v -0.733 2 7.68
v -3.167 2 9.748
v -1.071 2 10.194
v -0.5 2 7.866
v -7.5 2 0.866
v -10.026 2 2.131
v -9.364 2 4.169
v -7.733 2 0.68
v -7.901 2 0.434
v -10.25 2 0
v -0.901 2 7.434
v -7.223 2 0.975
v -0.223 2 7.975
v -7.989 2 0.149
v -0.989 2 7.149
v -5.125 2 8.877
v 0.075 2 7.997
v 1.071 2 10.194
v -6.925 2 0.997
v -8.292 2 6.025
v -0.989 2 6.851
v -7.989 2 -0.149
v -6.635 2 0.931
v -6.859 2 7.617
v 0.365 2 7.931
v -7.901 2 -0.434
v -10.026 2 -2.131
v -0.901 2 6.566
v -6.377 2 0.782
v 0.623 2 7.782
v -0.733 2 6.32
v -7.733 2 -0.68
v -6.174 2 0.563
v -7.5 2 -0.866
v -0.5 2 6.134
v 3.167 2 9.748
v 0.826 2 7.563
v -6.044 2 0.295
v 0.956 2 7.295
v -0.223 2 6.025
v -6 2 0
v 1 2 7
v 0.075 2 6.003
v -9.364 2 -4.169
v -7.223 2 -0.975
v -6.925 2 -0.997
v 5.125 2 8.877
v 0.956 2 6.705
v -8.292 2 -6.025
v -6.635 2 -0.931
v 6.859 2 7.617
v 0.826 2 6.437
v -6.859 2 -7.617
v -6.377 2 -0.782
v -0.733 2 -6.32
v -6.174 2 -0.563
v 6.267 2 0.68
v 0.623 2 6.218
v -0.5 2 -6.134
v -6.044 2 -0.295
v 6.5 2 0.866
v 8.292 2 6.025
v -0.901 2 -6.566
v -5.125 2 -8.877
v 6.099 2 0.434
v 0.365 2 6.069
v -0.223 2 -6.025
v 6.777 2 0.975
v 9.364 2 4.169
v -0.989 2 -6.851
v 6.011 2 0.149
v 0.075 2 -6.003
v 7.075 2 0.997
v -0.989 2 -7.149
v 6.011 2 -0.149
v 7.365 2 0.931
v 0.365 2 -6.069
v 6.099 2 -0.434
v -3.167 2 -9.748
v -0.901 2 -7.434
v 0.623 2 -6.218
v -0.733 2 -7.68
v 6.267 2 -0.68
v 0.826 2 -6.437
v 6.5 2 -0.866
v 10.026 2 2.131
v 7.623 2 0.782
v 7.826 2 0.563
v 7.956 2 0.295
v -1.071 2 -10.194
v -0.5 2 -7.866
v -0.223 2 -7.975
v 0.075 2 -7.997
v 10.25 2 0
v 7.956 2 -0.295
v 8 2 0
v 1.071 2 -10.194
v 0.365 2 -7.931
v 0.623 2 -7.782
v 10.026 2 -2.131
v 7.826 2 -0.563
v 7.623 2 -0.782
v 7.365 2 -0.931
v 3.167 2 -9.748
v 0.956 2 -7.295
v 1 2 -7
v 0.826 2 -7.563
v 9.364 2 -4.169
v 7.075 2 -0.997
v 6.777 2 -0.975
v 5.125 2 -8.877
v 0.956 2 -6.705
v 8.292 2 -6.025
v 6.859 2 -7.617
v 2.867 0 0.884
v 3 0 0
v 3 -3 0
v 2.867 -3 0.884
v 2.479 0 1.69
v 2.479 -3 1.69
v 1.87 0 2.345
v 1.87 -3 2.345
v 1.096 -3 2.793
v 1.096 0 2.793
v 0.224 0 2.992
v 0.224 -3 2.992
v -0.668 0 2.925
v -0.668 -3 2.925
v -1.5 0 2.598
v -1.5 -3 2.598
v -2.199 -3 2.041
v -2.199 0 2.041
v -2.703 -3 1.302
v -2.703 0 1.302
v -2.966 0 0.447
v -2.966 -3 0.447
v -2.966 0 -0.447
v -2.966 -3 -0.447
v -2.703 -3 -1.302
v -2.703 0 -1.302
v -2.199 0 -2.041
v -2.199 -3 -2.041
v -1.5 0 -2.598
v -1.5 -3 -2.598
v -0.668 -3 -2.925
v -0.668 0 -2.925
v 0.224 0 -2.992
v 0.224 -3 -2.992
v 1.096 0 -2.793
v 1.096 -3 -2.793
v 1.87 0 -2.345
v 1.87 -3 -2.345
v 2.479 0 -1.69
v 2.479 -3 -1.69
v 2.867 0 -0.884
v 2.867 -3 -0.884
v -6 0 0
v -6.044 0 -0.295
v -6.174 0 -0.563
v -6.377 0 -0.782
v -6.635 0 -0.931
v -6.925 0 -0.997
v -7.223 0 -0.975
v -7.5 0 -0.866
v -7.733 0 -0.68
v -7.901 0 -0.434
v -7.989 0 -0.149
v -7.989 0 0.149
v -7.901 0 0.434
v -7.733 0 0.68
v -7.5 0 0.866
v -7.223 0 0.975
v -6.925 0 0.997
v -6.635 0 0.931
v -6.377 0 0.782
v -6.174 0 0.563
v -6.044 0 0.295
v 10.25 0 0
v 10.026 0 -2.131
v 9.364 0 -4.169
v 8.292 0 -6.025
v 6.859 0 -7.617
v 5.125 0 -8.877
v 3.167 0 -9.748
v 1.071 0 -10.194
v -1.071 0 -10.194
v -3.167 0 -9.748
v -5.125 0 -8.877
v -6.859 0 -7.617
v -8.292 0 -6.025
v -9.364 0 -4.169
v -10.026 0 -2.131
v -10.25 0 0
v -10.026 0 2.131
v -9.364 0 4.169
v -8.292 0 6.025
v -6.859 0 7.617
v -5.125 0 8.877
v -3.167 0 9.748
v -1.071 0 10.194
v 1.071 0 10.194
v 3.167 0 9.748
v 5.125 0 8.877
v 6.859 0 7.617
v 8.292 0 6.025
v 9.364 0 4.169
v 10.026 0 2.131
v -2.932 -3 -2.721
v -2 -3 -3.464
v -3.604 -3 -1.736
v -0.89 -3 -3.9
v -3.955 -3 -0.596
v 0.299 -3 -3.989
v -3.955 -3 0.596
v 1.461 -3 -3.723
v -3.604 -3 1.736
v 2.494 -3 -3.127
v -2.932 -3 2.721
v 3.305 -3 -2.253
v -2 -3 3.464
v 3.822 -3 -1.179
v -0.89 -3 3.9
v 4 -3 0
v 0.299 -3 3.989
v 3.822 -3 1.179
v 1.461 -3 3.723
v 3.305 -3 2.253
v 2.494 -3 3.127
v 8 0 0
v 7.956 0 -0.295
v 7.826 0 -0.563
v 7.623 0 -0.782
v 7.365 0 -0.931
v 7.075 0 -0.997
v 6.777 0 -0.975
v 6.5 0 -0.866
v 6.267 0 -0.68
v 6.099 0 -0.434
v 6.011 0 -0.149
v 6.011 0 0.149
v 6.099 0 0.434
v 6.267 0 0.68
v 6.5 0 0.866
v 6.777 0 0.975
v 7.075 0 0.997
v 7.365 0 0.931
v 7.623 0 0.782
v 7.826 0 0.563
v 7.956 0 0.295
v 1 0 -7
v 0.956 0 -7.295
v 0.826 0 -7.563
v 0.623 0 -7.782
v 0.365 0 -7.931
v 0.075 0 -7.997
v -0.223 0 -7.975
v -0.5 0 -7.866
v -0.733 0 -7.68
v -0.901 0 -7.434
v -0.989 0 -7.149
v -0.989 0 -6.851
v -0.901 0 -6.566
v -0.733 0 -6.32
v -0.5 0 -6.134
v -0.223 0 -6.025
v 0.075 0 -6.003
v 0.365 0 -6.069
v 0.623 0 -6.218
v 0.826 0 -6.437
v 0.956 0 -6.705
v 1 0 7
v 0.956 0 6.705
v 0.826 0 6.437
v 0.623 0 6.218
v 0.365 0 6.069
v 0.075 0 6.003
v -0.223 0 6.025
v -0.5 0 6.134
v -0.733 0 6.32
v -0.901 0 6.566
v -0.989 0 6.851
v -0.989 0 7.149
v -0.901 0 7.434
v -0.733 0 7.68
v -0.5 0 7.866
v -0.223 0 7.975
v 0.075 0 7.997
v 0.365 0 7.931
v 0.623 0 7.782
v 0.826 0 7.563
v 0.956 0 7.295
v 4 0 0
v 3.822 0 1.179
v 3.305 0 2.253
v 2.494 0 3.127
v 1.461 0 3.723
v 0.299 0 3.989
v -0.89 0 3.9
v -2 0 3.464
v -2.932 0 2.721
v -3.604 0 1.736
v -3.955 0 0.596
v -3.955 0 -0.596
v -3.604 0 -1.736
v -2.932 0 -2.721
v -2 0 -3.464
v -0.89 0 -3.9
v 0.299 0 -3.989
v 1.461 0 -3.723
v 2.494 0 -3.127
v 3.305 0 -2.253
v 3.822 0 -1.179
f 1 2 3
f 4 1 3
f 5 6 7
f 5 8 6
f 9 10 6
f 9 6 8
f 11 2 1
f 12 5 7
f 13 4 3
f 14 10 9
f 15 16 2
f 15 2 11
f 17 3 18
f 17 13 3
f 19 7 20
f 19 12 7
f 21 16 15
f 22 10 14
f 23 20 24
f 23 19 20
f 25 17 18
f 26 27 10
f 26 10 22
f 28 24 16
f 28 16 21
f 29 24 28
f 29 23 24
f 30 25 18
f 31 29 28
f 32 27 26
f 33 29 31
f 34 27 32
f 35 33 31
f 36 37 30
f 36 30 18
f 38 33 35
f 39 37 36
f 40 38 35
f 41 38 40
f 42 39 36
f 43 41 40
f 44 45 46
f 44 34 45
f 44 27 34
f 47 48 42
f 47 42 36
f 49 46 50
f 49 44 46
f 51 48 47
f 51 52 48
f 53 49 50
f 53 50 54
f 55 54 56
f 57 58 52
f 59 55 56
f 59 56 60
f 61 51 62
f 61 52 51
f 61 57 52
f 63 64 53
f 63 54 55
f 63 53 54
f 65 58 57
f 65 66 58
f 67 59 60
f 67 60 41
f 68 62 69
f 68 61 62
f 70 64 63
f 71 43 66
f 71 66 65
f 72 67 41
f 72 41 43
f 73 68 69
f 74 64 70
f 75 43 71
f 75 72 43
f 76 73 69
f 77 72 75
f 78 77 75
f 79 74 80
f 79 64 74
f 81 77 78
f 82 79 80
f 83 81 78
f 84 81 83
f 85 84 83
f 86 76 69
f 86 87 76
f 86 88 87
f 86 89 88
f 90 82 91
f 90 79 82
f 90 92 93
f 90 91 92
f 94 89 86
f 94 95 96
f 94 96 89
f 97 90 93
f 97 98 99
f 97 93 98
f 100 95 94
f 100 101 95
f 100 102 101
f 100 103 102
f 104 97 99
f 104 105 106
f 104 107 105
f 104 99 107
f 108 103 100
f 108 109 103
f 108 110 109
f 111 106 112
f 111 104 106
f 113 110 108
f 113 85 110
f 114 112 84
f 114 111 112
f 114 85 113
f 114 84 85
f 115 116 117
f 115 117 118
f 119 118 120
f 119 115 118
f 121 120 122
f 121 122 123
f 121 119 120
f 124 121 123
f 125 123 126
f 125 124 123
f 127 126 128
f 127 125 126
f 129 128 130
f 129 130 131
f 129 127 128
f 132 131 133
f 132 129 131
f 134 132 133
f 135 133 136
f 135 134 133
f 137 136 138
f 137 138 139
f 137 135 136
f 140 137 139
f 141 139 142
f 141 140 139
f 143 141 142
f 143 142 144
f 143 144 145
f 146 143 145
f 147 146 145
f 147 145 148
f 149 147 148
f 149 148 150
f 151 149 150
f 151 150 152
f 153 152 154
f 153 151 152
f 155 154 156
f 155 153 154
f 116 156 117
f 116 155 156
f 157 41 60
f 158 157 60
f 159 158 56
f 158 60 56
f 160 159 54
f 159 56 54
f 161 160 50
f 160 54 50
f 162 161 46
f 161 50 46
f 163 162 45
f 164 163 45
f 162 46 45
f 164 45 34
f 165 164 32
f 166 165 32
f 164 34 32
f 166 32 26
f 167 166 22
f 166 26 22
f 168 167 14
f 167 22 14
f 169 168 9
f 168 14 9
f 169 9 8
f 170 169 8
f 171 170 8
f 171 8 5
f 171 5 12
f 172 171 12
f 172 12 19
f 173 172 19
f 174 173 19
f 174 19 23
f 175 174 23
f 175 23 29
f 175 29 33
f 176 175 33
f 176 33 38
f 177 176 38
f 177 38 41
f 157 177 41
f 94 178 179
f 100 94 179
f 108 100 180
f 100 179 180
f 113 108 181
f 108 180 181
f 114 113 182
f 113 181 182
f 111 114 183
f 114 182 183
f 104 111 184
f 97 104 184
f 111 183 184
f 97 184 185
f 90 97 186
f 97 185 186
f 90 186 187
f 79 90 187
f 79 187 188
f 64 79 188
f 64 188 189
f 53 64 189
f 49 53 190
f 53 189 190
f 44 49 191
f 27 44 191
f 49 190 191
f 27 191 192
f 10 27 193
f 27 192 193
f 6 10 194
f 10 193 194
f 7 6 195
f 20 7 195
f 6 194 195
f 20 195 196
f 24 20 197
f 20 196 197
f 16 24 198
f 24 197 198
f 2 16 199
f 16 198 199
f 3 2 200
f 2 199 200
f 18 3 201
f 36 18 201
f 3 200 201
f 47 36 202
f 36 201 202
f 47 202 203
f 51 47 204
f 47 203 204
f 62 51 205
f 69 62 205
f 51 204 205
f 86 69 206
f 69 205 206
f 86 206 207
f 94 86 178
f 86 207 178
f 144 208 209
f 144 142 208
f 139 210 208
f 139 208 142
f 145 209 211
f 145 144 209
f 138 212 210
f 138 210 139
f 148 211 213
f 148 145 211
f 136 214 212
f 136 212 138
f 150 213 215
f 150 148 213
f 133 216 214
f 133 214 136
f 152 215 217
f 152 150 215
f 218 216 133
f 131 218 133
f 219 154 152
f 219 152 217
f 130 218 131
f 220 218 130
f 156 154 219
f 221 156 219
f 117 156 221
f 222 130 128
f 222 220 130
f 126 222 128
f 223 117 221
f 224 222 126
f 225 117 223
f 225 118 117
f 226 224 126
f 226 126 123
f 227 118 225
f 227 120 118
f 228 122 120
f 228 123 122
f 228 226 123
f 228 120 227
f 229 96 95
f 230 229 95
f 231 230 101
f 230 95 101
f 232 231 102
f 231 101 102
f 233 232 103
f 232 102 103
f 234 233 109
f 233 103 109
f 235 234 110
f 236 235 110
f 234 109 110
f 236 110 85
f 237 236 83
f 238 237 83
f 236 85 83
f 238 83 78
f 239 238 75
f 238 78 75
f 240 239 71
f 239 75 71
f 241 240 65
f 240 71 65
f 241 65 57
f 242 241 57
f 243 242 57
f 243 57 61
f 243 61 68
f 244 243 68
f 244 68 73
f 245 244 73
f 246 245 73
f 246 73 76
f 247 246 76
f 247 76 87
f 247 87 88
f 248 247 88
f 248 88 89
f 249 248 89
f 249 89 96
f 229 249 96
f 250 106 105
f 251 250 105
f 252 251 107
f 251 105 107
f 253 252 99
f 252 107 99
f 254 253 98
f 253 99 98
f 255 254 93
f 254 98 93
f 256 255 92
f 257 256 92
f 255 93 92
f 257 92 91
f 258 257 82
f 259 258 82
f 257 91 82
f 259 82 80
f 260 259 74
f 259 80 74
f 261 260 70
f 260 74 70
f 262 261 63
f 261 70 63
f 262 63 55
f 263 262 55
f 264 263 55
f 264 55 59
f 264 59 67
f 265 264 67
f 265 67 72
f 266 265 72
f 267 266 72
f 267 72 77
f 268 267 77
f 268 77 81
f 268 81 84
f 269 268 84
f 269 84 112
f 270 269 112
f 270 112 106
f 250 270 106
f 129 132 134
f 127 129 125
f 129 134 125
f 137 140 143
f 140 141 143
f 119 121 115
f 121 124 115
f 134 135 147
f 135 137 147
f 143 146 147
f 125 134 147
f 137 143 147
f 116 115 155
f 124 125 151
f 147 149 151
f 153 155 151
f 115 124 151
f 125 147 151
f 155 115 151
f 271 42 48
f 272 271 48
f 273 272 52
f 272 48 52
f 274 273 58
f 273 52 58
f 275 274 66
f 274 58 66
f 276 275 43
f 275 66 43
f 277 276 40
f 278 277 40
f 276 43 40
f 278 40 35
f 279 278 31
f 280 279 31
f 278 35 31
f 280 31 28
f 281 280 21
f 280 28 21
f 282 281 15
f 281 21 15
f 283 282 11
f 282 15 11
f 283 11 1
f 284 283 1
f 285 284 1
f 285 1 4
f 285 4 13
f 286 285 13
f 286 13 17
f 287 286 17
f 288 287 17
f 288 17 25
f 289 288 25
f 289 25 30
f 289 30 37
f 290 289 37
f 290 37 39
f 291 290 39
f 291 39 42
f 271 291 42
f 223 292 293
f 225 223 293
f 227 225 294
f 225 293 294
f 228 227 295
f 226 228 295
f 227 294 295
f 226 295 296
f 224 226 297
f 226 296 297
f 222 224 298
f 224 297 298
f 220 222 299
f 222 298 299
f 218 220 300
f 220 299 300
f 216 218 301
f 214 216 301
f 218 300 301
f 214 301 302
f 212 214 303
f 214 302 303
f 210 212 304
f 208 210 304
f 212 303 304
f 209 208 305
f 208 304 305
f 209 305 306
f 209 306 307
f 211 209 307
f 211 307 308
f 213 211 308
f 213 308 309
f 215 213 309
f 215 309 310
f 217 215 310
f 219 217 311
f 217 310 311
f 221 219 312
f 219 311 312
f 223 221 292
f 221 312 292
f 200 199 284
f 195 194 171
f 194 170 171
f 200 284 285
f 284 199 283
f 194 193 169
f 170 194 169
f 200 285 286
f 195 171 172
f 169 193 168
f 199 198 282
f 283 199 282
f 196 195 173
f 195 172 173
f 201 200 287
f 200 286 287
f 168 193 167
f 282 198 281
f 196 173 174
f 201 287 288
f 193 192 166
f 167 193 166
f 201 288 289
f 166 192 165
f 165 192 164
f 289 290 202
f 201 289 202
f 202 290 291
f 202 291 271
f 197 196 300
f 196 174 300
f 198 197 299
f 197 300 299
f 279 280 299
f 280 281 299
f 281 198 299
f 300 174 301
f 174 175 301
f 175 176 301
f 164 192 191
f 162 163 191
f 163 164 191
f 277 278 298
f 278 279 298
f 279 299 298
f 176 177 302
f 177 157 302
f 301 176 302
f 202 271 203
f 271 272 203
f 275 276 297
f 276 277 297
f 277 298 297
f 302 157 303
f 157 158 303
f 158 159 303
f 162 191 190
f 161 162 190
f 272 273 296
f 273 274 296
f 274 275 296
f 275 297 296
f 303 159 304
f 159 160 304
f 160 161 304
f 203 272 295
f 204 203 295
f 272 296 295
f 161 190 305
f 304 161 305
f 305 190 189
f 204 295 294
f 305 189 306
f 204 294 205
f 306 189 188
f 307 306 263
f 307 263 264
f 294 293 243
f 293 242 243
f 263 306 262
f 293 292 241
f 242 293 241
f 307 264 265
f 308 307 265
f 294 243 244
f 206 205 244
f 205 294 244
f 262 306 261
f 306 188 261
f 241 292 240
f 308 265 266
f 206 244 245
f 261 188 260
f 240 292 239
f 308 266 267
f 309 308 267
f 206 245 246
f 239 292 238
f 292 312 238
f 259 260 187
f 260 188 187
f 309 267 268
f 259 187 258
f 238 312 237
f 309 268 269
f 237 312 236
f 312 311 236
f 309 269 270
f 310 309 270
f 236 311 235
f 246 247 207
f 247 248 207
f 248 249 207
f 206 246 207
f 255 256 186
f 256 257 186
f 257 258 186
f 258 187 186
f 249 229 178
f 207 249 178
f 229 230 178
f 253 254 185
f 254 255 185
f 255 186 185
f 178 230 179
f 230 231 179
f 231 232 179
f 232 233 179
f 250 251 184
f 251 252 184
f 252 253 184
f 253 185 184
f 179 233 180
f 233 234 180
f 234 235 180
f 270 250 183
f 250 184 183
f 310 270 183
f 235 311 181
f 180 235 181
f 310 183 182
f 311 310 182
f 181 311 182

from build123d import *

# Parameters (mm, degrees)
SKETCH_1_R          = 10.25
EXTRUDE_1_DEPTH     = 2
SKETCH_2_R          = 4
SKETCH_2_R_2        = 3
EXTRUDE_2_DEPTH     = 3
SKETCH_4_R          = 1
CUT_EXTRUDE_1_DEPTH = 3


with BuildPart() as part:
    # 草图1 → 凸台-拉伸1 (new body)
    with BuildSketch(Plane(origin=(0, 0, 0), x_dir=(1, 0, 0), z_dir=(0, 1, 0))):
        Circle(SKETCH_1_R)
    extrude(amount=EXTRUDE_1_DEPTH)

    # 草图2 → 凸台-拉伸2 (add)
    with BuildSketch(Plane.XZ):
        Circle(SKETCH_2_R)
        Circle(SKETCH_2_R_2, mode=Mode.SUBTRACT)
    extrude(amount=EXTRUDE_2_DEPTH)

    # 草图4 → 切除-拉伸1 (cut)
    with BuildSketch(Plane(origin=(0, 2, 0), x_dir=(1, 0, 0), z_dir=(0, 1, 0))):
        with Locations((-7, 0)):
            Circle(SKETCH_4_R)
        with Locations((0, 7)):
            Circle(SKETCH_4_R)
        with Locations((7, 0)):
            Circle(SKETCH_4_R)
        with Locations((0, -7)):
            Circle(SKETCH_4_R)
    extrude(amount=-CUT_EXTRUDE_1_DEPTH, mode=Mode.SUBTRACT)


solid = part.part
